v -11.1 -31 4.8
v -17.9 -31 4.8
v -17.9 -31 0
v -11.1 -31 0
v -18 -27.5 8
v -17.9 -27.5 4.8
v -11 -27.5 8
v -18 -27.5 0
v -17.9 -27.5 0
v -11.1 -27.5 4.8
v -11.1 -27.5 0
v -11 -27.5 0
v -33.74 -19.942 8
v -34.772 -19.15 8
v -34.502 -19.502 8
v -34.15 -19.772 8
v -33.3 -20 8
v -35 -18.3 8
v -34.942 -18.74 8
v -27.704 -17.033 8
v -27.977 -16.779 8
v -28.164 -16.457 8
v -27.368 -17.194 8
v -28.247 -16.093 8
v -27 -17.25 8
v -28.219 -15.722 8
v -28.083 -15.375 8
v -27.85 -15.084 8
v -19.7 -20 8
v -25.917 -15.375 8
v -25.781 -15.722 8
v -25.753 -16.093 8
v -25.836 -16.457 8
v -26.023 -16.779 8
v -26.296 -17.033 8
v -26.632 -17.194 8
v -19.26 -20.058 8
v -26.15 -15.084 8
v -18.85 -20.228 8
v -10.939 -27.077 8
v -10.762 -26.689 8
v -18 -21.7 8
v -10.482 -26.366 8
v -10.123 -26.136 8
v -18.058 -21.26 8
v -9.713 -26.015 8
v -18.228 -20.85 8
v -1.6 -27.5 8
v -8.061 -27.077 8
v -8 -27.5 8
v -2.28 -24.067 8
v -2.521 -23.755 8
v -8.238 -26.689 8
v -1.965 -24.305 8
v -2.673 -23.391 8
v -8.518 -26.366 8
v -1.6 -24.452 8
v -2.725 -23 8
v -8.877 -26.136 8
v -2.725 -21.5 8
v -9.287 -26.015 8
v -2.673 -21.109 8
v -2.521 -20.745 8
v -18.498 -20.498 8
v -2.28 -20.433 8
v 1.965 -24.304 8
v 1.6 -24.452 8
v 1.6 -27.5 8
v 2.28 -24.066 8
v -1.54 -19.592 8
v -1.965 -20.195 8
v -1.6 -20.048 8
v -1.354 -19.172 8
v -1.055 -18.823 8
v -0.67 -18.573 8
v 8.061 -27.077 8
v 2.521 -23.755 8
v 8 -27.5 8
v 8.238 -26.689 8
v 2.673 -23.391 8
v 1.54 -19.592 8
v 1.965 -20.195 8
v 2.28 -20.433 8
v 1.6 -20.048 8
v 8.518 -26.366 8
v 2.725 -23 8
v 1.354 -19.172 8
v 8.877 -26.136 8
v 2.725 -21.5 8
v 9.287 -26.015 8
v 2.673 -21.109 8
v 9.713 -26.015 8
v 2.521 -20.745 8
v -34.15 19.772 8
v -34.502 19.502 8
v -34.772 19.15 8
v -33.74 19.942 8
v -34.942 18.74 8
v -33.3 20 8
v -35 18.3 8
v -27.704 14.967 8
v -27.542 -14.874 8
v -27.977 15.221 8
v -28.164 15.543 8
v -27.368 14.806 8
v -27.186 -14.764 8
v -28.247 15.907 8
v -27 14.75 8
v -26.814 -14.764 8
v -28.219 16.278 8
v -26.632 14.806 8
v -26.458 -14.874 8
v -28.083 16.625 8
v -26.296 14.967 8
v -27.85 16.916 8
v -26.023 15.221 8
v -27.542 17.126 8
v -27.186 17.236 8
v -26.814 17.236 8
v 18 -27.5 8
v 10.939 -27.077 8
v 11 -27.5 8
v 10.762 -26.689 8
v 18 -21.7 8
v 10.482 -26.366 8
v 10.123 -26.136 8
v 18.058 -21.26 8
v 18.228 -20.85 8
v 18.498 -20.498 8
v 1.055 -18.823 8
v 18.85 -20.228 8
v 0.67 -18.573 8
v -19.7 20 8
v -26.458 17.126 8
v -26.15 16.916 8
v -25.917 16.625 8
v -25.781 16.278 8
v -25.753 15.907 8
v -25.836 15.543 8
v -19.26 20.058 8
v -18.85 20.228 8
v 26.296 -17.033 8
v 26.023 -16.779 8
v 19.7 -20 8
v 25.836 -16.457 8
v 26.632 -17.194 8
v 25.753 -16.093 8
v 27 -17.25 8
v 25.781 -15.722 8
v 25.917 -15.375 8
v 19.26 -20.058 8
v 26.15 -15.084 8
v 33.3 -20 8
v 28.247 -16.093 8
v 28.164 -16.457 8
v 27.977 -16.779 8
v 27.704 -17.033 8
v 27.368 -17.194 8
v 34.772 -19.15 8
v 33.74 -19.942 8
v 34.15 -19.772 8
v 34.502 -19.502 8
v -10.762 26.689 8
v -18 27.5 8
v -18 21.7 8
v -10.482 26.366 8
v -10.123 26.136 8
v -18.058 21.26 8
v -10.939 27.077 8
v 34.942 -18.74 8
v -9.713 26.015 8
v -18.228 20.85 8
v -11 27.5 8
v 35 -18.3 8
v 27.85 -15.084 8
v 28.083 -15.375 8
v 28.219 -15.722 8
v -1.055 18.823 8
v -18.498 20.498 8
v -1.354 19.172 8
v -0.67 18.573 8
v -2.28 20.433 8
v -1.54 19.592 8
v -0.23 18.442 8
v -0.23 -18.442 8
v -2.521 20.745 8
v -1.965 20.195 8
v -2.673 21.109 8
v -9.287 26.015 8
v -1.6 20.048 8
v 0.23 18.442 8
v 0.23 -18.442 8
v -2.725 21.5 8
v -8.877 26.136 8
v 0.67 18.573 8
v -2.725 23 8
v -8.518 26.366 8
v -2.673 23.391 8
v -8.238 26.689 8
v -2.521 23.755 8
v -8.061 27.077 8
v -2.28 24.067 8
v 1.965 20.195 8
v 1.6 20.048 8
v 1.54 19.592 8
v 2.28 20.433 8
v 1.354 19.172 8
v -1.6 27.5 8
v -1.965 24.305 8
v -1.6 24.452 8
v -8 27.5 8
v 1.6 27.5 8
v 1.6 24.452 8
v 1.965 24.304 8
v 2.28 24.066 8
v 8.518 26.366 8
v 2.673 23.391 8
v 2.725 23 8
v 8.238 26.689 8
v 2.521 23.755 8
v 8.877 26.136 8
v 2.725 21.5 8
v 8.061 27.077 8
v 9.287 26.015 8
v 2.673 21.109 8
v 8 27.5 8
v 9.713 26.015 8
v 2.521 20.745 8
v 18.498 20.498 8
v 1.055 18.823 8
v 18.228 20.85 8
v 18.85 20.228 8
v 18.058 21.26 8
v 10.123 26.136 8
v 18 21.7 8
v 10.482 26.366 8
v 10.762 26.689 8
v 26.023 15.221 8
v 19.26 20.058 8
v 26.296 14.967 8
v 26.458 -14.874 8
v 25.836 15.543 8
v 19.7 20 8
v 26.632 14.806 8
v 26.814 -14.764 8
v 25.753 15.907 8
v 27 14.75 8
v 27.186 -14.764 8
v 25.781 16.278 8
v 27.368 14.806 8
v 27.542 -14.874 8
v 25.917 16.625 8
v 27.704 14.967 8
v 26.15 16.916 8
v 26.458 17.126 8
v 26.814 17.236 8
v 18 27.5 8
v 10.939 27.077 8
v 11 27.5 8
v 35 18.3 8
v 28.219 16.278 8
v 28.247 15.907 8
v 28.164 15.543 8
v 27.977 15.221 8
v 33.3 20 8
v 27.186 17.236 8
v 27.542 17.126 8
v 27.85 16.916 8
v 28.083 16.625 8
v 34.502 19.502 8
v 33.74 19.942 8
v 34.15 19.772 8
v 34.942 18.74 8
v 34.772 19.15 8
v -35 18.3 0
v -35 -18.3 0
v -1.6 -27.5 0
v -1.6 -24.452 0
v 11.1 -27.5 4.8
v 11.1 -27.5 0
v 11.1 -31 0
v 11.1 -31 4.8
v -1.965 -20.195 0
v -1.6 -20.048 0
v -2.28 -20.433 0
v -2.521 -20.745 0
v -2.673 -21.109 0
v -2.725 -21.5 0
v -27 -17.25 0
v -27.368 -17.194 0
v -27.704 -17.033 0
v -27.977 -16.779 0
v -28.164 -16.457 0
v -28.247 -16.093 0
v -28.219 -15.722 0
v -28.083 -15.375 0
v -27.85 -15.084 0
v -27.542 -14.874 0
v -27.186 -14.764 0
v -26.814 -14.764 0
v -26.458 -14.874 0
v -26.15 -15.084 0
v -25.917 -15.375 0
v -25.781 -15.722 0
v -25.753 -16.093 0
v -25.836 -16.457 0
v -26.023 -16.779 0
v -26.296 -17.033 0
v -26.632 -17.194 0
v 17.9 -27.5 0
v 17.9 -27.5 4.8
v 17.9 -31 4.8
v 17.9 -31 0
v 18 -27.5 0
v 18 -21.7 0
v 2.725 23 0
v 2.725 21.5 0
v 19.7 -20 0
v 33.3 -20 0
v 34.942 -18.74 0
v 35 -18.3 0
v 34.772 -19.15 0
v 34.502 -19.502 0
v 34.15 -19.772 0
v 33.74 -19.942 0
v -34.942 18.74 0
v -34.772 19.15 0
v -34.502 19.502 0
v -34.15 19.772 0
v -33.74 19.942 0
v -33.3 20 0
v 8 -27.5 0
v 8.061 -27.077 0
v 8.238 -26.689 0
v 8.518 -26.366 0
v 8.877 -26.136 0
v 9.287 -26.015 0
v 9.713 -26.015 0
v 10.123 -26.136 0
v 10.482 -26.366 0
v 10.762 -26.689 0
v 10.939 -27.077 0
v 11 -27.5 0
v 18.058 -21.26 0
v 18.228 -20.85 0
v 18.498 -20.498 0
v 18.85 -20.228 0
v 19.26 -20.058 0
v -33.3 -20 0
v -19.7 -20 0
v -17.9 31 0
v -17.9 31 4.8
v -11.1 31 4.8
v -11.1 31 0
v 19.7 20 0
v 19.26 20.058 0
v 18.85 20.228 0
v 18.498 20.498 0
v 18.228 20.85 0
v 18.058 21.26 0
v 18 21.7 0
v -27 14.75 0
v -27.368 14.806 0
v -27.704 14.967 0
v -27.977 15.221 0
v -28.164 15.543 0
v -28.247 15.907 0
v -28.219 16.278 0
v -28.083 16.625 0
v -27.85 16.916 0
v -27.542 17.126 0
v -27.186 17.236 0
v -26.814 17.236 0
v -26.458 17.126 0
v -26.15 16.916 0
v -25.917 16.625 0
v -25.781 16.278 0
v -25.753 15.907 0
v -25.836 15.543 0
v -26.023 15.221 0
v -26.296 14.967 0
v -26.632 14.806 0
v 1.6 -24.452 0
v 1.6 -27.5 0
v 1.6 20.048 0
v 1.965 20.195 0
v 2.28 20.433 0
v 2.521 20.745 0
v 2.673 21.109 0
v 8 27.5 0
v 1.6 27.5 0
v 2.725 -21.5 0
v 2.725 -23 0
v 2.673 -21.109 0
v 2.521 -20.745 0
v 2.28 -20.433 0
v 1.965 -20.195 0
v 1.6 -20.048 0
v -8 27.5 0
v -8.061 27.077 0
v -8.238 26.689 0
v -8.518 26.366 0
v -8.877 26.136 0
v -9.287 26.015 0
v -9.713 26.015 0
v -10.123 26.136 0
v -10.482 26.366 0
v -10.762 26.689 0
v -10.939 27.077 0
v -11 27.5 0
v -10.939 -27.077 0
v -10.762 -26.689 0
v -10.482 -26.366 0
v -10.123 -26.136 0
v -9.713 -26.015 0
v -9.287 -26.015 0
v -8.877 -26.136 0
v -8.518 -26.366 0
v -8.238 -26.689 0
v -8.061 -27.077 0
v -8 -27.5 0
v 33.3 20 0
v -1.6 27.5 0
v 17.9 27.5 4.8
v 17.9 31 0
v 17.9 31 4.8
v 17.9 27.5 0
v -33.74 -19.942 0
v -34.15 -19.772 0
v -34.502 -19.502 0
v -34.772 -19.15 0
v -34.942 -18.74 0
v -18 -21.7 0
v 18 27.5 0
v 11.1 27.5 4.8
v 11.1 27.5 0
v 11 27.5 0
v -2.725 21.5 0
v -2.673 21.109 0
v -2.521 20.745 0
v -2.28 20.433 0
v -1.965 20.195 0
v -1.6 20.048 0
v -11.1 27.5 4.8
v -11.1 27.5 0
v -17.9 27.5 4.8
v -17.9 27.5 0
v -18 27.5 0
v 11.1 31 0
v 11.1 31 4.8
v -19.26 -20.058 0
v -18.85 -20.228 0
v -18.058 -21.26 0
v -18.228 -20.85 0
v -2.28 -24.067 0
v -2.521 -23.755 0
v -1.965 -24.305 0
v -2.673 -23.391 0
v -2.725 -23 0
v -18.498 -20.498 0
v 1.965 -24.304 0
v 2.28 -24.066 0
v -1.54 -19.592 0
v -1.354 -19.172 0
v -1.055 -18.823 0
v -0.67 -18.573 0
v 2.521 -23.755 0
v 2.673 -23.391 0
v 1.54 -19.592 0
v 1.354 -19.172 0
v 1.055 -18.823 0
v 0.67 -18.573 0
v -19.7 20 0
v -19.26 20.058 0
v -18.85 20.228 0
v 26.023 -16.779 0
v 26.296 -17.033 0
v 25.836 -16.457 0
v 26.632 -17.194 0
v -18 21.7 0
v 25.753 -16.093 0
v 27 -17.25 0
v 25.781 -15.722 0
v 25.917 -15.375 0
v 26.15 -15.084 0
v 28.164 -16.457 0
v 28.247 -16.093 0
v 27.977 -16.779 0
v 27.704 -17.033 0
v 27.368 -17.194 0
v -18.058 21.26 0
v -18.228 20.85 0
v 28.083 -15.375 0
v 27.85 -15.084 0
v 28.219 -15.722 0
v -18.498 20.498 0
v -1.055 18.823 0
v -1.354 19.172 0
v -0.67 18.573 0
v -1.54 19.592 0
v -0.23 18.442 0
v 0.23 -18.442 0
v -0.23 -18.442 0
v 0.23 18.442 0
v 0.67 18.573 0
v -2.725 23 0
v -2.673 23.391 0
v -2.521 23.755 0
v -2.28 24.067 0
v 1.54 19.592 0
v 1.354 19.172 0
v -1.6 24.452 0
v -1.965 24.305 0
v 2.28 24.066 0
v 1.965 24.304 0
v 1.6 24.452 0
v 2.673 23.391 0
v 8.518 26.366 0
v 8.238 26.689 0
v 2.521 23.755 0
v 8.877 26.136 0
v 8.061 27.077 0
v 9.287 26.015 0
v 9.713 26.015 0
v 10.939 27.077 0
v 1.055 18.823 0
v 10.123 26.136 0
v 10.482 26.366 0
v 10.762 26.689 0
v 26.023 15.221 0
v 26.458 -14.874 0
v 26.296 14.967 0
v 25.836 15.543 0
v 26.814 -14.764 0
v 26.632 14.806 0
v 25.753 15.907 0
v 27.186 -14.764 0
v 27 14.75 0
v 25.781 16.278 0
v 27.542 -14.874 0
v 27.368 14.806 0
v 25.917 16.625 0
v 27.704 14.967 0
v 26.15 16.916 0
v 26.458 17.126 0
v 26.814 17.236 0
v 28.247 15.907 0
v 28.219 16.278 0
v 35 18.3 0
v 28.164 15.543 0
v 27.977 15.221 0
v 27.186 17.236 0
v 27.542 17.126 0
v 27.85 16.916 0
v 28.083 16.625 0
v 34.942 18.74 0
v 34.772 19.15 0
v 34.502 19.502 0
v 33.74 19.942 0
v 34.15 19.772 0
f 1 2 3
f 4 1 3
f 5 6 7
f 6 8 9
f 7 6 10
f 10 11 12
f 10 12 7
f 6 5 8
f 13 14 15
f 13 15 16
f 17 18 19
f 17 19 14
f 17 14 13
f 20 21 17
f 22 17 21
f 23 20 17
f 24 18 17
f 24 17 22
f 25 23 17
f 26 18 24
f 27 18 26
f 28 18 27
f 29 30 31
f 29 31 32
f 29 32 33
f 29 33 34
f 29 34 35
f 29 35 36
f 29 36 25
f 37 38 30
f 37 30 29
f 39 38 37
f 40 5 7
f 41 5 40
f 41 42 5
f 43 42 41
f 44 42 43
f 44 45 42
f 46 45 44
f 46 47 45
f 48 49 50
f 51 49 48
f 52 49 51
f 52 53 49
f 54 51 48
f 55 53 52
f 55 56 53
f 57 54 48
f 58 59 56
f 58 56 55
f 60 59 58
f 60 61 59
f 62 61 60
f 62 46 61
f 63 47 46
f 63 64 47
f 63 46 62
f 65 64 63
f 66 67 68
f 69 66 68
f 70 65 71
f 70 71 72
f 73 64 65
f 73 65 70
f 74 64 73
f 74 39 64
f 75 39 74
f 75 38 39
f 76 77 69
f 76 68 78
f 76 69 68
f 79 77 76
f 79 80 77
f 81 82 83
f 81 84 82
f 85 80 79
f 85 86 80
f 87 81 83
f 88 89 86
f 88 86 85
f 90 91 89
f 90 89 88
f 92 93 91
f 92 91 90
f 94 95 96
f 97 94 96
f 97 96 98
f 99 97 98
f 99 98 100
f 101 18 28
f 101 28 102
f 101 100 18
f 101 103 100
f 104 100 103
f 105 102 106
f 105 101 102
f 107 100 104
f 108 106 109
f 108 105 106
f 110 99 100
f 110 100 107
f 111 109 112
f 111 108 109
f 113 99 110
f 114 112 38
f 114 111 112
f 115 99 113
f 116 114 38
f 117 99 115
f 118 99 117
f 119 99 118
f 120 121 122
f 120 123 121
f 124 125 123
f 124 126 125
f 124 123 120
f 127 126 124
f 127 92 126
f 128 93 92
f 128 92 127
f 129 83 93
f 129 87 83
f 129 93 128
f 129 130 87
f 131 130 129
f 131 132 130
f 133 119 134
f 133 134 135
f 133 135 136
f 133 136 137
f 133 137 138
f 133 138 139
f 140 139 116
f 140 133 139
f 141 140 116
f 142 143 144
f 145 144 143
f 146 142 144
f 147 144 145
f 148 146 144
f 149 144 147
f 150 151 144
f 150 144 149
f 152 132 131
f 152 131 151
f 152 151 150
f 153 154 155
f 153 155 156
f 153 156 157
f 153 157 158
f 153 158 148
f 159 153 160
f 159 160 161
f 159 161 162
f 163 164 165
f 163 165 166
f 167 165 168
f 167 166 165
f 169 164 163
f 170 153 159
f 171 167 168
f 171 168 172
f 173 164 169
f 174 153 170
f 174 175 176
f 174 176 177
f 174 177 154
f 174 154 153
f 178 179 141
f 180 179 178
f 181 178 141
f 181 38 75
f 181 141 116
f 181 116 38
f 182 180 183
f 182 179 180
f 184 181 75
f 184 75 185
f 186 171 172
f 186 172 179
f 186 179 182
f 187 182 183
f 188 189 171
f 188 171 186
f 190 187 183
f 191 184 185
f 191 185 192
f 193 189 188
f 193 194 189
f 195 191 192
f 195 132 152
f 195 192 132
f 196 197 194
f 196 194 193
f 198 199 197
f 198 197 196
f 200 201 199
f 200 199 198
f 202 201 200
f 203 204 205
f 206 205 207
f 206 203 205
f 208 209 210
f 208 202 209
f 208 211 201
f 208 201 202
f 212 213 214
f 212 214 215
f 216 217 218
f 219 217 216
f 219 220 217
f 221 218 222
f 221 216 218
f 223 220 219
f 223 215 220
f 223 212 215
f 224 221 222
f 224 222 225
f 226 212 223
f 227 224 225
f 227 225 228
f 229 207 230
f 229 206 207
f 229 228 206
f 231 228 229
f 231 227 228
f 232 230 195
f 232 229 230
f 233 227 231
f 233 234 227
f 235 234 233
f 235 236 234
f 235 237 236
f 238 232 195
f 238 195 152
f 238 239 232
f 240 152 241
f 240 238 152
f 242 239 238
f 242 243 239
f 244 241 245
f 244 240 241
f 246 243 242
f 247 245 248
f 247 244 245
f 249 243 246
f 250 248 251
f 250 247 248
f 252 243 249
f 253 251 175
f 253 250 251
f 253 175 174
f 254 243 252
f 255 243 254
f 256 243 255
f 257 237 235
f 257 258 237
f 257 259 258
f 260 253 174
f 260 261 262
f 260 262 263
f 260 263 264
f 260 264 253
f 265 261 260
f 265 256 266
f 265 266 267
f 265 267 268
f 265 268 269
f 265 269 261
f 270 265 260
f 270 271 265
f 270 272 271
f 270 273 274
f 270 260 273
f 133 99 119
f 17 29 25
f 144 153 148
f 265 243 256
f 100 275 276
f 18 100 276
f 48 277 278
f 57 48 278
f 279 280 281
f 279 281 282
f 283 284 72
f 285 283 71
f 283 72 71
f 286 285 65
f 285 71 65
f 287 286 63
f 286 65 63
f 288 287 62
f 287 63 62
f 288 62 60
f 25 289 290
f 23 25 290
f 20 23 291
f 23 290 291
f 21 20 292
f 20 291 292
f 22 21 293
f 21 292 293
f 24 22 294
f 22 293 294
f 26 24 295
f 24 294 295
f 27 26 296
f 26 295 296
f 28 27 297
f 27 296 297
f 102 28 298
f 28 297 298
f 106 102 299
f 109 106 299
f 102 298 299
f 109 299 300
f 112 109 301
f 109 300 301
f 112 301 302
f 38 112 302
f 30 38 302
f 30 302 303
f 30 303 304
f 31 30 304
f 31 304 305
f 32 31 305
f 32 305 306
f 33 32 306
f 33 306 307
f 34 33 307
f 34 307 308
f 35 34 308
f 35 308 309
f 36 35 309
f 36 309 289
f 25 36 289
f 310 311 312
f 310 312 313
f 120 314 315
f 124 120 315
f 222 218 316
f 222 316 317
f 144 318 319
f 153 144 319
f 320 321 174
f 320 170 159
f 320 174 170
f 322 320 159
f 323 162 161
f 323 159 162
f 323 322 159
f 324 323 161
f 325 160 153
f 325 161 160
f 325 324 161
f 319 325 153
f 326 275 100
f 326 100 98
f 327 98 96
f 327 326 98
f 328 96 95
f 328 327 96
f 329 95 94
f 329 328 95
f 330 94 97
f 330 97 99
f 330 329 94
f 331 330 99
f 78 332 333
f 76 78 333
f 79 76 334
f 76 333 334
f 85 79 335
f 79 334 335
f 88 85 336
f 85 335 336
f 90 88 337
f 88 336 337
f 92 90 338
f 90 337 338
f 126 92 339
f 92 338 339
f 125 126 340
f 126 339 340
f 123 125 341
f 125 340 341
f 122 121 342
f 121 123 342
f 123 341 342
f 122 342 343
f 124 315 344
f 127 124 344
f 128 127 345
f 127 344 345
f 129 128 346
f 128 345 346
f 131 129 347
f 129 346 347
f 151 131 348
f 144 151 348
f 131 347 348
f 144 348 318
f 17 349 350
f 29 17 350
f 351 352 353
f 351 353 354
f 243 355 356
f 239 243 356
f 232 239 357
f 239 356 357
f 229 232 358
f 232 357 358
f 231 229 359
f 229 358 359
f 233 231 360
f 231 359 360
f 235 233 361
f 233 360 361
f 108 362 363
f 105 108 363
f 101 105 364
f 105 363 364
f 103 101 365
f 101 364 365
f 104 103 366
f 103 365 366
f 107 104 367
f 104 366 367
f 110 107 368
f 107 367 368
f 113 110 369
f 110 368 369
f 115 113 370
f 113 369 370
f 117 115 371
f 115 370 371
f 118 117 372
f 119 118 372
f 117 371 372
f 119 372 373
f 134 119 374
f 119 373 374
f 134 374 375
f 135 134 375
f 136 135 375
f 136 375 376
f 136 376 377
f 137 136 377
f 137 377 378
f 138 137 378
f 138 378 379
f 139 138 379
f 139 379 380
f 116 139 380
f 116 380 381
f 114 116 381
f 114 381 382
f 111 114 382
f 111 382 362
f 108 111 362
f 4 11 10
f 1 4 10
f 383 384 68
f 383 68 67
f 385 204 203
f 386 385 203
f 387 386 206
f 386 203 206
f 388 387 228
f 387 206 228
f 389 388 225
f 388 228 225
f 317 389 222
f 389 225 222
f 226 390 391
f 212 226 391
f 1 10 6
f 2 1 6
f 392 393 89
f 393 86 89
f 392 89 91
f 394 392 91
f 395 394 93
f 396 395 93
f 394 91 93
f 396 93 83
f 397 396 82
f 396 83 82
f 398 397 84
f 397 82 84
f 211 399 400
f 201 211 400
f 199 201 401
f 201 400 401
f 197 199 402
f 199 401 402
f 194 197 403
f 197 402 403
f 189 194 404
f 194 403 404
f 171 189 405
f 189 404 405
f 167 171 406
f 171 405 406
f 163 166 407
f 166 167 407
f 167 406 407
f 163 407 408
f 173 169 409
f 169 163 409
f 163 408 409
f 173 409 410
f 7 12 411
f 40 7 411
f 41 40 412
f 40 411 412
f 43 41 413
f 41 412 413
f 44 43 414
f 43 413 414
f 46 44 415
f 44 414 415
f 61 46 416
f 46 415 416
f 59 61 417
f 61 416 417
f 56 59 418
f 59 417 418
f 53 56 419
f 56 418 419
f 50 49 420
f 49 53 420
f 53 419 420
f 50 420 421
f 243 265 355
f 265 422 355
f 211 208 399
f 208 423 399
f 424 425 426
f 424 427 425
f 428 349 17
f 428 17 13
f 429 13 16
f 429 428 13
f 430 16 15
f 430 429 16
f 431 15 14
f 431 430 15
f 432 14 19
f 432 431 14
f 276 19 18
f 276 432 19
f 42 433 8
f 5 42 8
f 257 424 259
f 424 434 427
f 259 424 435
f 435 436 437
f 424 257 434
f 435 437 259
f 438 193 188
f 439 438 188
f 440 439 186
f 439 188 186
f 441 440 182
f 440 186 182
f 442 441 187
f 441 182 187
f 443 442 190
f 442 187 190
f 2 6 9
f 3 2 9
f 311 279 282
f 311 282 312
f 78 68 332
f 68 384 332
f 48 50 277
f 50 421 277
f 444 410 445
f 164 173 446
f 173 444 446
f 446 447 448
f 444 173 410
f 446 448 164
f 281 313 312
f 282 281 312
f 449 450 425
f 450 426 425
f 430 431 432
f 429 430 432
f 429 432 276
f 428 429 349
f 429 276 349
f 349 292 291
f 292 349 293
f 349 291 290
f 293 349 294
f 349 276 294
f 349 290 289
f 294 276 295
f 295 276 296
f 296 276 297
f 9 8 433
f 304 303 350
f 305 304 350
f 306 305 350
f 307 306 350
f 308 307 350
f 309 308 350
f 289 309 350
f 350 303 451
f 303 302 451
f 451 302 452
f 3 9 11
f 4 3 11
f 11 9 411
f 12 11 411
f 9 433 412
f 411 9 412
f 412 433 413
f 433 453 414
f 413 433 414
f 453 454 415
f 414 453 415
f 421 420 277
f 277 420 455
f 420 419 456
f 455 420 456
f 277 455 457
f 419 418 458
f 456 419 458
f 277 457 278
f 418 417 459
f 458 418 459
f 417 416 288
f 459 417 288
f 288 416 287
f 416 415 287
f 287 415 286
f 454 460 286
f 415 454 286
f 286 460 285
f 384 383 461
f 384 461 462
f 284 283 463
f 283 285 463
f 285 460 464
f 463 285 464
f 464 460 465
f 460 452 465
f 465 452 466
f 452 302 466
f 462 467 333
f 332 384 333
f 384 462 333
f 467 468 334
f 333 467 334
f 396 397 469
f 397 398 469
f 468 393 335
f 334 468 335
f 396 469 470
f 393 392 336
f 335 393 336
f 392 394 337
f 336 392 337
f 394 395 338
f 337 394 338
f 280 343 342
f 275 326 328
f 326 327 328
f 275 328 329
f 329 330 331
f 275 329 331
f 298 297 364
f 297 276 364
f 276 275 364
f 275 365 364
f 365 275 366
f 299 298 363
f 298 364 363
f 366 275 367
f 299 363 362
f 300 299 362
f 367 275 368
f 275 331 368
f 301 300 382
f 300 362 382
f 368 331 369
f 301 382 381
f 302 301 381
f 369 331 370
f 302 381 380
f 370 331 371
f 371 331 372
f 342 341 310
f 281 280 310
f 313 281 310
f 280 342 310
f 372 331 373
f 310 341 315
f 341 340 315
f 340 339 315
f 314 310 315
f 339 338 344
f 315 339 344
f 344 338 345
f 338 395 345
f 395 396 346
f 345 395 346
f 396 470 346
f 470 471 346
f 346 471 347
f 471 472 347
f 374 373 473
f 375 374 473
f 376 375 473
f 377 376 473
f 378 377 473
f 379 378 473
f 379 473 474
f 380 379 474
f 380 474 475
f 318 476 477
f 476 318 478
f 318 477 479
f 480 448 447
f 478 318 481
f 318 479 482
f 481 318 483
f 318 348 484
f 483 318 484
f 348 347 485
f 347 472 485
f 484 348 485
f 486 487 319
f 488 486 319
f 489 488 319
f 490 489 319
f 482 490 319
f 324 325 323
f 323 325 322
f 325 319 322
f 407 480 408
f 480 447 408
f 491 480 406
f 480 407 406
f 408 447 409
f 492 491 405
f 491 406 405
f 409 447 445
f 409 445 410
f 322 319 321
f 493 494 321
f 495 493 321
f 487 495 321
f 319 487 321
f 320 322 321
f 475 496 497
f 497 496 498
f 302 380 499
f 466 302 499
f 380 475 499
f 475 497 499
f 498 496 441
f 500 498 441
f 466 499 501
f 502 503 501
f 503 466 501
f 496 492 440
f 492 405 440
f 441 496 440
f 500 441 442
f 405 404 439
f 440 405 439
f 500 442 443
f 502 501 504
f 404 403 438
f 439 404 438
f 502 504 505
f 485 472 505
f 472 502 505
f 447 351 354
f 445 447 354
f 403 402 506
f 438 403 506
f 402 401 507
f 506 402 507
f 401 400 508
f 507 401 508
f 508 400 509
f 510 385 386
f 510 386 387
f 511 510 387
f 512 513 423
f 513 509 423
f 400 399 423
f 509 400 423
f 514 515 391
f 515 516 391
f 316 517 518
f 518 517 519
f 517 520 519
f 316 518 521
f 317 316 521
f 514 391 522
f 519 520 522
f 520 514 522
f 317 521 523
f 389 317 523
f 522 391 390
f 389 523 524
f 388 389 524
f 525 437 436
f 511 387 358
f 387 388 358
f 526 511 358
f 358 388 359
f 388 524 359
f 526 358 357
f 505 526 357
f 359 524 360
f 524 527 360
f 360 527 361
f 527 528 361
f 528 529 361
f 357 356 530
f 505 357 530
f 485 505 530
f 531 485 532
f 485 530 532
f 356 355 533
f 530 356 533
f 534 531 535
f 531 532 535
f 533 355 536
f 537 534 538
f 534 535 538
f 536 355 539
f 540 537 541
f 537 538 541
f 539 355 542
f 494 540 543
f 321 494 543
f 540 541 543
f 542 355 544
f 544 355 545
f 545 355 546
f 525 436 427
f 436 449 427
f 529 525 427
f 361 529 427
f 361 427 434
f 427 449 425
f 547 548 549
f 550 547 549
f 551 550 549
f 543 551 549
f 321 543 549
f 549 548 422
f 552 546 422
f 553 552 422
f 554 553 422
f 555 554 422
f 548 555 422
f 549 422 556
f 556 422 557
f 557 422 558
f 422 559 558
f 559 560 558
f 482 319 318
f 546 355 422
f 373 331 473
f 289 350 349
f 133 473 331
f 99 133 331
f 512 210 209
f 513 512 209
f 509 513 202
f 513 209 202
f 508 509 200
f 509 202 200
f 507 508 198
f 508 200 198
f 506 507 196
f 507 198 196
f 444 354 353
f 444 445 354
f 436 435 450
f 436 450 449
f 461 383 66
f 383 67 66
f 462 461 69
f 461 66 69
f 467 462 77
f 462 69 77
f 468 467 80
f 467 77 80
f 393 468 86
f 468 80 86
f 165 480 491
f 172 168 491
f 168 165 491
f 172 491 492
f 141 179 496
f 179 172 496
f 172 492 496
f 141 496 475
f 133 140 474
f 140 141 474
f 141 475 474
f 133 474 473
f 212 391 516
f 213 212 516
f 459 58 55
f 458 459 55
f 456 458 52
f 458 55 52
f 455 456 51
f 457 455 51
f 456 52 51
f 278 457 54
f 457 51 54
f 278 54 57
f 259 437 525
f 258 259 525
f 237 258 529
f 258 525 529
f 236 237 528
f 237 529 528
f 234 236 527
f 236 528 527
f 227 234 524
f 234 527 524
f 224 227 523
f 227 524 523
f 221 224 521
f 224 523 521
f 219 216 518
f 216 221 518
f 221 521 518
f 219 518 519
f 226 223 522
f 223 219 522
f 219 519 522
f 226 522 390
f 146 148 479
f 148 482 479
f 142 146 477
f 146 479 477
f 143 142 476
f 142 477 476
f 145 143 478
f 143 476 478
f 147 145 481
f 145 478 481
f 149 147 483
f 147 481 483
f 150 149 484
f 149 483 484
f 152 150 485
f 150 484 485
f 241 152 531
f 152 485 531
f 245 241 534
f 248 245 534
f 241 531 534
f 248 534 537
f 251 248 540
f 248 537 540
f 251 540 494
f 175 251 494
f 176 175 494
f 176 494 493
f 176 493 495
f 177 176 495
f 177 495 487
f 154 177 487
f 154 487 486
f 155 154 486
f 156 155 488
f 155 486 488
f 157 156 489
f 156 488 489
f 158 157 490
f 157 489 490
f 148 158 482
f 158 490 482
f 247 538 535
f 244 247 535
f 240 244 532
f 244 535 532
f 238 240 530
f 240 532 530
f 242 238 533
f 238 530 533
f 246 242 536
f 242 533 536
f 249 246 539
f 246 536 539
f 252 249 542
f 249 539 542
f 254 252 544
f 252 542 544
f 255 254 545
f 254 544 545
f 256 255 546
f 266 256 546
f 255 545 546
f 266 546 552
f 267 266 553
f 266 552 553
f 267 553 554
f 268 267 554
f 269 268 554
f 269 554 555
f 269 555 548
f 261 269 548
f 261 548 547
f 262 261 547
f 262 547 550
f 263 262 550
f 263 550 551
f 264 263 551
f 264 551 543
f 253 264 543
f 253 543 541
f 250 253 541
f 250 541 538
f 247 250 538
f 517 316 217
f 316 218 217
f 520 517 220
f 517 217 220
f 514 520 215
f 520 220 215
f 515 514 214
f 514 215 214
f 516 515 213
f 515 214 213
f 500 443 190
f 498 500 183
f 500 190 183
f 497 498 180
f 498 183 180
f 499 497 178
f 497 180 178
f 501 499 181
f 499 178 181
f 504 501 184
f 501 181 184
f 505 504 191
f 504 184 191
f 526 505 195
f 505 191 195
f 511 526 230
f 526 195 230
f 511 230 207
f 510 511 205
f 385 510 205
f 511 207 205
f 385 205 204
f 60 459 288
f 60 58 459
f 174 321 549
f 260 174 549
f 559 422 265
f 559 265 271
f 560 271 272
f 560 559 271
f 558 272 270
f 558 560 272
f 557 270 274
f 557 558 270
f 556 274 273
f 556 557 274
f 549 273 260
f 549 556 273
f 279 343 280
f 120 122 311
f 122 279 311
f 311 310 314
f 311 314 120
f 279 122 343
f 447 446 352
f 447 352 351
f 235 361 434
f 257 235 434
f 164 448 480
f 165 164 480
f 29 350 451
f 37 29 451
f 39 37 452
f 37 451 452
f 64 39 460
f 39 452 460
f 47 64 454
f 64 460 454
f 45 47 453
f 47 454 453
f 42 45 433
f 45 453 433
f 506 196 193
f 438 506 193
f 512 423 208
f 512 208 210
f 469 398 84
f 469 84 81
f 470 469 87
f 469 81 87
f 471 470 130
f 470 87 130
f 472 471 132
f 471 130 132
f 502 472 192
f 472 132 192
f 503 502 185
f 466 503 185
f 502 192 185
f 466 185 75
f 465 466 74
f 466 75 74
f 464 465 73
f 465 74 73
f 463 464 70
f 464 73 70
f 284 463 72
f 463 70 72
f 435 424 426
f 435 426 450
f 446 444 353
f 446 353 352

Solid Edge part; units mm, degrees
sketch "Sketch1" plane through (0, 0, 0) normal (0, 0, 1) x (1, 0, 0)
  line L0 (-18, -27.5) -> (18, -27.5)
  line L1 (18, -27.5) -> (18, -21.7)
  arc A0 (18, -21.7) -> (19.7, -20) centre (19.7, -21.7) cw
  line L2 (19.7, -20) -> (33.3, -20)
  arc A1 (33.3, -20) -> (35, -18.3) centre (33.3, -18.3) ccw
  line L3 (35, -18.3) -> (35, 18.3)
  arc A2 (33.3, 20) -> (35, 18.3) centre (33.3, 18.3) cw
  line L4 (33.3, 20) -> (19.7, 20)
  arc A3 (18, 21.7) -> (19.7, 20) centre (19.7, 21.7) ccw
  line L5 (18, 21.7) -> (18, 27.5)
  line L6 (18, 27.5) -> (-18, 27.5)
  line L7 (-18, 27.5) -> (-18, 21.7)
  arc A4 (-19.7, 20) -> (-18, 21.7) centre (-19.7, 21.7) ccw
  line L8 (-19.7, 20) -> (-33.3, 20)
  arc A5 (-35, 18.3) -> (-33.3, 20) centre (-33.3, 18.3) cw
  line L9 (-35, 18.3) -> (-35, -18.3)
  arc A6 (-35, -18.3) -> (-33.3, -20) centre (-33.3, -18.3) ccw
  line L10 (-33.3, -20) -> (-19.7, -20)
  arc A7 (-19.7, -20) -> (-18, -21.7) centre (-19.7, -21.7) cw
  line L11 (-18, -21.7) -> (-18, -27.5)
extrude "Protrusion1" add sketch "Sketch1" along normal blind 8
sketch "Sketch2" plane through (0, -27.5, 4) normal (0, -1, 0) x (1, 0, 0)
  line L0 (-11.1, 0.8) -> (-17.9, 0.8)
  line L1 (-17.9, 0.8) -> (-17.9, -4)
  line L2 (-17.9, -4) -> (-11.1, -4)
  line L3 (-11.1, -4) -> (-11.1, 0.8)
  line L4 (11.1, 0.8) -> (17.9, 0.8)
  line L5 (17.9, 0.8) -> (17.9, -4)
  line L6 (17.9, -4) -> (11.1, -4)
  line L7 (11.1, -4) -> (11.1, 0.8)
extrude "ExtrudedProtrusion_2" add sketch "Sketch2" along normal blind 3.5
sketch "Sketch3" plane through (0, 27.5, 4) normal (0, 1, 0) x (-1, 0, 0)
  line L0 (-17.9, 0.8) -> (-11.1, 0.8)
  line L1 (-11.1, 0.8) -> (-11.1, -4)
  line L2 (-11.1, -4) -> (-17.9, -4)
  line L3 (-17.9, -4) -> (-17.9, 0.8)
extrude "ExtrudedProtrusion_3" add sketch "Sketch3" along normal blind 3.5
sketch "Sketch4" plane through (0, 0, 0) normal (0, 0, -1) x (0, 1, 0)
  arc A0 (-27.5, -8) -> (-27.5, -11) centre (-27.5, -9.5) cw
  line L0 (-27.5, -8) -> (-27.5, -11)
  arc A1 (-27.5, 11) -> (-27.5, 8) centre (-27.5, 9.5) cw
  line L1 (-27.5, 8) -> (-27.5, 11)
  arc A2 (27.5, -11) -> (27.5, -8) centre (27.5, -9.5) cw
  line L2 (27.5, -8) -> (27.5, -11)
  arc A3 (27.5, 8) -> (27.5, 11) centre (27.5, 9.5) cw
  line L3 (27.5, 8) -> (27.5, 11)
extrude "ExtrudedCutout_2" cut sketch "Sketch4" against normal blind 8
sketch "Sketch5" plane through (0, 27.5, 4) normal (0, 1, 0) x (-1, 0, 0)
  line L0 (11.1, 0.8) -> (17.9, 0.8)
  line L1 (17.9, 0.8) -> (17.9, -4)
  line L2 (17.9, -4) -> (11.1, -4)
  line L3 (11.1, -4) -> (11.1, 0.8)
extrude "ExtrudedProtrusion_4" add sketch "Sketch5" along normal blind 3.5
sketch "Sketch6" plane through (0, 0, 8) normal (0, 0, 1) x (-1, 0, 0)
  arc A0 (-1.5998, 20.0476) -> (1.5998, 20.0476) centre (0, 20.0254) ccw
  arc A1 (2.725, 21.5) -> (1.5998, 20.0476) centre (1.225, 21.5) cw
  line L0 (2.725, 23) -> (2.725, 21.5)
  arc A2 (1.5998, 24.4524) -> (2.725, 23) centre (1.225, 23) cw
  line L1 (1.5998, 27.5) -> (1.5998, 24.4524)
  line L2 (0, 27.5) -> (1.5998, 27.5)
  line L3 (0, 27.5) -> (-1.6, 27.5)
  line L4 (-1.6, 27.5) -> (-1.6, 24.4524)
  arc A3 (-1.6, 24.4524) -> (-2.725, 23) centre (-1.225, 23) ccw
  line L5 (-2.725, 23) -> (-2.725, 21.5)
  arc A4 (-2.725, 21.5) -> (-1.5998, 20.0476) centre (-1.225, 21.5) ccw
  arc A5 (-1.5998, -20.0476) -> (1.5998, -20.0476) centre (0, -20.0254) cw
  arc A6 (2.725, -21.5) -> (1.5998, -20.0476) centre (1.225, -21.5) ccw
  line L6 (2.725, -23) -> (2.725, -21.5)
  arc A7 (1.5998, -24.4524) -> (2.725, -23) centre (1.225, -23) ccw
  line L7 (1.5998, -27.5) -> (1.5998, -24.4524)
  line L8 (0, -27.5) -> (1.5998, -27.5)
  line L9 (0, -27.5) -> (-1.6, -27.5)
  line L10 (-1.6, -27.5) -> (-1.6, -24.4524)
  arc A8 (-1.6, -24.4524) -> (-2.725, -23) centre (-1.225, -23) cw
  line L11 (-2.725, -23) -> (-2.725, -21.5)
  arc A9 (-2.725, -21.5) -> (-1.5998, -20.0476) centre (-1.225, -21.5) cw
extrude "Cutout1" cut sketch "Sketch6" against normal up to next
sketch "Sketch7" plane through (0, 0, 0) normal (0, 0, -1) x (0, -1, 0)
  circle A0 centre (16, 27) radius 1.25
  circle A1 centre (-16, 27) radius 1.25
  circle A2 centre (-16, -27) radius 1.25
  circle A3 centre (16, -27) radius 1.25
extrude "Cutout2" cut sketch "Sketch7" against normal through all
properties material "Polycarbonate"
